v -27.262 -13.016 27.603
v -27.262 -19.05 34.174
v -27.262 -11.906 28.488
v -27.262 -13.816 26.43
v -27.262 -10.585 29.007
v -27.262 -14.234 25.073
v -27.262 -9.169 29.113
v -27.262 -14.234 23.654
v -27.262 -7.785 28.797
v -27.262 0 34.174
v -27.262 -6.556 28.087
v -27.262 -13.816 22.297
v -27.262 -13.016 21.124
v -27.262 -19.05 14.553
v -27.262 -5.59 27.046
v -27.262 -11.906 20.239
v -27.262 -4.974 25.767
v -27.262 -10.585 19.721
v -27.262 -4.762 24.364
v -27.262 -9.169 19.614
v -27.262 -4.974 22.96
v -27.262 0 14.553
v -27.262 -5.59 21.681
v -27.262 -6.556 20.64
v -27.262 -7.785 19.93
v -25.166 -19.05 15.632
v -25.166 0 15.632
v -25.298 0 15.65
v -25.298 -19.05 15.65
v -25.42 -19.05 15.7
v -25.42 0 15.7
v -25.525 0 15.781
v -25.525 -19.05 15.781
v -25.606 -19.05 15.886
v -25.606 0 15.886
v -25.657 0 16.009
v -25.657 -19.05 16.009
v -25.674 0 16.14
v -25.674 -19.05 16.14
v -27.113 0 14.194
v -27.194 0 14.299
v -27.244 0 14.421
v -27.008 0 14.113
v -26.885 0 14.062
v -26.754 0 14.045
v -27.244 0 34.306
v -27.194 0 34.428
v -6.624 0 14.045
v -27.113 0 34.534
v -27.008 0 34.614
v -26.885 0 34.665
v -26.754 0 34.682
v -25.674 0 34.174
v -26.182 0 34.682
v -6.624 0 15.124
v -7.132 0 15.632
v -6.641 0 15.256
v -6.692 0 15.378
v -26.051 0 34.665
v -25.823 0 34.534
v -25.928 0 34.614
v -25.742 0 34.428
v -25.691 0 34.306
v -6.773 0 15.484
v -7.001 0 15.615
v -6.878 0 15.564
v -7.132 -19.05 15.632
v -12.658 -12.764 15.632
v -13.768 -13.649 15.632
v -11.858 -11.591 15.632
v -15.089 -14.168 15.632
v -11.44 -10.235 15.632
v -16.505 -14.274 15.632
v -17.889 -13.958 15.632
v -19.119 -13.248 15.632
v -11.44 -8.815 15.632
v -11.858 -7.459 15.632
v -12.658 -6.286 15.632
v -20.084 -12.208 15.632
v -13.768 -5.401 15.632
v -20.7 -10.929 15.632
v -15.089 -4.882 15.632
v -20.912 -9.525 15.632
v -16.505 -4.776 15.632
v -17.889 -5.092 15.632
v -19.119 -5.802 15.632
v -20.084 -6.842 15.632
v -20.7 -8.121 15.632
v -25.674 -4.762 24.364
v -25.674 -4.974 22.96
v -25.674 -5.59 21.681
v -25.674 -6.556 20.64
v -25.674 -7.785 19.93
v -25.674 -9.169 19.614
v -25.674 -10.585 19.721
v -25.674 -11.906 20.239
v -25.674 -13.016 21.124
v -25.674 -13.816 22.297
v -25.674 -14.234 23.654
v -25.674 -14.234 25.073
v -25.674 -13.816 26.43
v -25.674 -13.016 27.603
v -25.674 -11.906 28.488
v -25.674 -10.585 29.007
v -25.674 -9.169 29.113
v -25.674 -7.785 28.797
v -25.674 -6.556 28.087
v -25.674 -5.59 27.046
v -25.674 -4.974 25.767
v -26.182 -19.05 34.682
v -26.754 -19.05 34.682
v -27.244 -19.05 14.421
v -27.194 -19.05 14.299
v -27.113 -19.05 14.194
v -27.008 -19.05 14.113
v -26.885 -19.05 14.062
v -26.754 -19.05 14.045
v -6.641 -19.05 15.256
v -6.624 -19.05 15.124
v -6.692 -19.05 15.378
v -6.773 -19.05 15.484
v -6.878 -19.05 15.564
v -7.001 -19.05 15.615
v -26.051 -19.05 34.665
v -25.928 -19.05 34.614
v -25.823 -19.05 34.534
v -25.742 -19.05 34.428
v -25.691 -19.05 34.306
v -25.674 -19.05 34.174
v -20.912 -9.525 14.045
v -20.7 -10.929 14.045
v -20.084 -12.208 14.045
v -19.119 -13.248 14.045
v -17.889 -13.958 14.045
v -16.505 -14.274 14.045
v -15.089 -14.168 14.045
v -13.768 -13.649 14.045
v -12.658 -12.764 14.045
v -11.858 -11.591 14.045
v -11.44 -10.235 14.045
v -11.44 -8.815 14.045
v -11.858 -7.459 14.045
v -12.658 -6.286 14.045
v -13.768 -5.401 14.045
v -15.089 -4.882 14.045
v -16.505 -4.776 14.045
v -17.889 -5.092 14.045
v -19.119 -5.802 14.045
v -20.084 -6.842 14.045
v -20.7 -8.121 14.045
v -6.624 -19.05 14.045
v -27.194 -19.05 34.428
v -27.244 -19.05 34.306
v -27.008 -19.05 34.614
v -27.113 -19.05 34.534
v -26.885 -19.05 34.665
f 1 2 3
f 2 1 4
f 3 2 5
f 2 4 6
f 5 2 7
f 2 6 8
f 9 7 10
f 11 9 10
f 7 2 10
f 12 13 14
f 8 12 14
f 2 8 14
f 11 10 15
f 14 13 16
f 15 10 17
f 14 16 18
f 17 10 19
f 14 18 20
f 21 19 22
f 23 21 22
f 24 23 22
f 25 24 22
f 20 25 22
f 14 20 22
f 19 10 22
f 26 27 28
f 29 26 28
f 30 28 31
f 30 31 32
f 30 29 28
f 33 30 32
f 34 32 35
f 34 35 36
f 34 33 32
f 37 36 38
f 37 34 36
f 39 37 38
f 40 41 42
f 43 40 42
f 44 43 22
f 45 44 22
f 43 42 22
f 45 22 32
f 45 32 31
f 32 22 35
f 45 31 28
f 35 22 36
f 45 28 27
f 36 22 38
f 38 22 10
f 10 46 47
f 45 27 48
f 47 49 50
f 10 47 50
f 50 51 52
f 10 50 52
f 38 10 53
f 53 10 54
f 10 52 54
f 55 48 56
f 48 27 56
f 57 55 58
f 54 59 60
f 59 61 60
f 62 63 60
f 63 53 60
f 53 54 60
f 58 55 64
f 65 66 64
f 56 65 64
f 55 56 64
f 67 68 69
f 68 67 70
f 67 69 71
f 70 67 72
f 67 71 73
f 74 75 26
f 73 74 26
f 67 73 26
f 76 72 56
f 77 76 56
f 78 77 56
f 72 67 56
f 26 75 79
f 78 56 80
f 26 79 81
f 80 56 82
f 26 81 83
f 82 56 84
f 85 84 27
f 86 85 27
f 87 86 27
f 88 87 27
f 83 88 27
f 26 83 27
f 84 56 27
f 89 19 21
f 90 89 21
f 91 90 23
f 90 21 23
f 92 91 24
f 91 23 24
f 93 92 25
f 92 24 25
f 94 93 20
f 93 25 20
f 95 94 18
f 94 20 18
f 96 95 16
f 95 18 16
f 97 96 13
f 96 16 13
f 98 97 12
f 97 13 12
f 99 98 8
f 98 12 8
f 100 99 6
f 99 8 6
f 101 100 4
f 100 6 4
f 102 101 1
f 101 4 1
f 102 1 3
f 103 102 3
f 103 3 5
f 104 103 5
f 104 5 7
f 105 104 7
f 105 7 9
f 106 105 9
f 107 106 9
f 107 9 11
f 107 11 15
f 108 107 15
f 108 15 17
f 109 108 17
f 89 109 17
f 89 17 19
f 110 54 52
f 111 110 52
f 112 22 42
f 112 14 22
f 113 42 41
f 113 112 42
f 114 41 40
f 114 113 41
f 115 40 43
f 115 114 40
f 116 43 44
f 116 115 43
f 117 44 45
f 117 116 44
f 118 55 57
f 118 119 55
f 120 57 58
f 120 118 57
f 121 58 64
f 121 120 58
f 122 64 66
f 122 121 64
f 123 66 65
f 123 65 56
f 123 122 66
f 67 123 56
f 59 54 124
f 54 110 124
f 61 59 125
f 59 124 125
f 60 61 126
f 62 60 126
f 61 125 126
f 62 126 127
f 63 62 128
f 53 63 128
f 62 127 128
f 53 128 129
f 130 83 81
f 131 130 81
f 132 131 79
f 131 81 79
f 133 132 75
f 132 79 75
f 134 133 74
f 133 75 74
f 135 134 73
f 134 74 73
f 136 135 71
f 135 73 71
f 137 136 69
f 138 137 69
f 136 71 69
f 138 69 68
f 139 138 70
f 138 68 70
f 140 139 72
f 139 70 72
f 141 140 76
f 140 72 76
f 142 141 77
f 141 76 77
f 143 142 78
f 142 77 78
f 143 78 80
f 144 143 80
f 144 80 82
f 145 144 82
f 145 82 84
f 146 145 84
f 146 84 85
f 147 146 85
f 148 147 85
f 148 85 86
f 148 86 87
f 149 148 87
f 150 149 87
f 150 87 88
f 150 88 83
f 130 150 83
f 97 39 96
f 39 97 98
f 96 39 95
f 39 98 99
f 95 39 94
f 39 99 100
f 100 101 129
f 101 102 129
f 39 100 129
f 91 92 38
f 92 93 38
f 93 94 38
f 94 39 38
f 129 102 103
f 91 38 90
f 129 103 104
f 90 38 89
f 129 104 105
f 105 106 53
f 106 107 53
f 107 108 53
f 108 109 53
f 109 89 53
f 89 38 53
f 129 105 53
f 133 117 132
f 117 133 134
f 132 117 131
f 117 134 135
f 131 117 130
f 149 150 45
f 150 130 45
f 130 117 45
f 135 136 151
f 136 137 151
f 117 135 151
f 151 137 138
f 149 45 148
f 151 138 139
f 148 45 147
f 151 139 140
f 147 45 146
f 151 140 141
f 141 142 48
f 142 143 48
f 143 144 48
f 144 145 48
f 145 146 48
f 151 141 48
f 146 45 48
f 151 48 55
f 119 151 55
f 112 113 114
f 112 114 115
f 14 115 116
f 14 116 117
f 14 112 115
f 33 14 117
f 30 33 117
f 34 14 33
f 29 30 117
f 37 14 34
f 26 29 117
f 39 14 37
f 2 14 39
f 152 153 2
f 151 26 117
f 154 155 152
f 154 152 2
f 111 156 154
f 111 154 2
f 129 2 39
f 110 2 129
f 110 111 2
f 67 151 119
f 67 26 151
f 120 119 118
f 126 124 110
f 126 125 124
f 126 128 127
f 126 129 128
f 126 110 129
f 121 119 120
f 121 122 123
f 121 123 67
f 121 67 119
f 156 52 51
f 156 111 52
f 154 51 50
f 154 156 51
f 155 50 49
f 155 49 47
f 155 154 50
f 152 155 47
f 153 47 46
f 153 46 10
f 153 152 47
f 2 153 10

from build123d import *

# Parameters (mm, degrees)
F1_DEPTH = 19.05
F2_R     = 0.508
F4_DEPTH = 25.4
F6_DEPTH = 25.4


with BuildPart() as f1:
    # F0 (on Front) → F1 (new body)
    with BuildSketch(Plane.XZ):
        Polygon((-25.6741352886, 34.6823864549), (-27.2616352886, 34.6823864549), (-27.2616352886, 14.0448864549), (-6.6241352886, 14.0448864549), (-6.6241352886, 15.6323864549), (-25.6741352886, 15.6323864549), align=None)
    extrude(amount=F1_DEPTH)

    # F2
    f2_edges = [f1.edges().sort_by_distance(p)[0] for p in [
        (-27.261635, -9.525, 14.044886),
        (-27.261635, -9.525, 34.682386),
        (-25.674135, -9.525, 34.682386),
        (-6.624135, -9.525, 15.632386),
        (-25.674135, -9.525, 15.632386),
    ]]
    fillet(f2_edges, radius=F2_R)

    # F3 (on face) → F4 (cut)
    with BuildSketch(Plane(origin=(-27.2616352886, 0, 0), x_dir=(0, -1, 0), z_dir=(-1, 0, 0))):
        with BuildLine():
            Line((4.7625, 24.3636364549), (14.2875, 24.3636364549))
            ThreePointArc((14.2875, 24.3636364549), (9.525, 29.1261364549), (4.7625, 24.3636364549))
        make_face()
        with BuildLine():
            ThreePointArc((4.7625, 24.3636364549), (9.525, 19.6011364549), (14.2875, 24.3636364549))
            Line((14.2875, 24.3636364549), (4.7625, 24.3636364549))
        make_face()
    extrude(amount=-F4_DEPTH, mode=Mode.SUBTRACT)

    # F5 (on face) → F6 (cut)
    with BuildSketch(Plane.XY.offset(15.6323864549)):
        with BuildLine():
            Line((-20.9116352886, -9.525), (-11.3866352886, -9.525))
            ThreePointArc((-11.3866352886, -9.525), (-16.1491352886, -4.7625), (-20.9116352886, -9.525))
        make_face()
        with BuildLine():
            ThreePointArc((-20.9116352886, -9.525), (-16.1491352886, -14.2875), (-11.3866352886, -9.525))
            Line((-11.3866352886, -9.525), (-20.9116352886, -9.525))
        make_face()
    extrude(amount=-F6_DEPTH, mode=Mode.SUBTRACT)


solid = f1.part
